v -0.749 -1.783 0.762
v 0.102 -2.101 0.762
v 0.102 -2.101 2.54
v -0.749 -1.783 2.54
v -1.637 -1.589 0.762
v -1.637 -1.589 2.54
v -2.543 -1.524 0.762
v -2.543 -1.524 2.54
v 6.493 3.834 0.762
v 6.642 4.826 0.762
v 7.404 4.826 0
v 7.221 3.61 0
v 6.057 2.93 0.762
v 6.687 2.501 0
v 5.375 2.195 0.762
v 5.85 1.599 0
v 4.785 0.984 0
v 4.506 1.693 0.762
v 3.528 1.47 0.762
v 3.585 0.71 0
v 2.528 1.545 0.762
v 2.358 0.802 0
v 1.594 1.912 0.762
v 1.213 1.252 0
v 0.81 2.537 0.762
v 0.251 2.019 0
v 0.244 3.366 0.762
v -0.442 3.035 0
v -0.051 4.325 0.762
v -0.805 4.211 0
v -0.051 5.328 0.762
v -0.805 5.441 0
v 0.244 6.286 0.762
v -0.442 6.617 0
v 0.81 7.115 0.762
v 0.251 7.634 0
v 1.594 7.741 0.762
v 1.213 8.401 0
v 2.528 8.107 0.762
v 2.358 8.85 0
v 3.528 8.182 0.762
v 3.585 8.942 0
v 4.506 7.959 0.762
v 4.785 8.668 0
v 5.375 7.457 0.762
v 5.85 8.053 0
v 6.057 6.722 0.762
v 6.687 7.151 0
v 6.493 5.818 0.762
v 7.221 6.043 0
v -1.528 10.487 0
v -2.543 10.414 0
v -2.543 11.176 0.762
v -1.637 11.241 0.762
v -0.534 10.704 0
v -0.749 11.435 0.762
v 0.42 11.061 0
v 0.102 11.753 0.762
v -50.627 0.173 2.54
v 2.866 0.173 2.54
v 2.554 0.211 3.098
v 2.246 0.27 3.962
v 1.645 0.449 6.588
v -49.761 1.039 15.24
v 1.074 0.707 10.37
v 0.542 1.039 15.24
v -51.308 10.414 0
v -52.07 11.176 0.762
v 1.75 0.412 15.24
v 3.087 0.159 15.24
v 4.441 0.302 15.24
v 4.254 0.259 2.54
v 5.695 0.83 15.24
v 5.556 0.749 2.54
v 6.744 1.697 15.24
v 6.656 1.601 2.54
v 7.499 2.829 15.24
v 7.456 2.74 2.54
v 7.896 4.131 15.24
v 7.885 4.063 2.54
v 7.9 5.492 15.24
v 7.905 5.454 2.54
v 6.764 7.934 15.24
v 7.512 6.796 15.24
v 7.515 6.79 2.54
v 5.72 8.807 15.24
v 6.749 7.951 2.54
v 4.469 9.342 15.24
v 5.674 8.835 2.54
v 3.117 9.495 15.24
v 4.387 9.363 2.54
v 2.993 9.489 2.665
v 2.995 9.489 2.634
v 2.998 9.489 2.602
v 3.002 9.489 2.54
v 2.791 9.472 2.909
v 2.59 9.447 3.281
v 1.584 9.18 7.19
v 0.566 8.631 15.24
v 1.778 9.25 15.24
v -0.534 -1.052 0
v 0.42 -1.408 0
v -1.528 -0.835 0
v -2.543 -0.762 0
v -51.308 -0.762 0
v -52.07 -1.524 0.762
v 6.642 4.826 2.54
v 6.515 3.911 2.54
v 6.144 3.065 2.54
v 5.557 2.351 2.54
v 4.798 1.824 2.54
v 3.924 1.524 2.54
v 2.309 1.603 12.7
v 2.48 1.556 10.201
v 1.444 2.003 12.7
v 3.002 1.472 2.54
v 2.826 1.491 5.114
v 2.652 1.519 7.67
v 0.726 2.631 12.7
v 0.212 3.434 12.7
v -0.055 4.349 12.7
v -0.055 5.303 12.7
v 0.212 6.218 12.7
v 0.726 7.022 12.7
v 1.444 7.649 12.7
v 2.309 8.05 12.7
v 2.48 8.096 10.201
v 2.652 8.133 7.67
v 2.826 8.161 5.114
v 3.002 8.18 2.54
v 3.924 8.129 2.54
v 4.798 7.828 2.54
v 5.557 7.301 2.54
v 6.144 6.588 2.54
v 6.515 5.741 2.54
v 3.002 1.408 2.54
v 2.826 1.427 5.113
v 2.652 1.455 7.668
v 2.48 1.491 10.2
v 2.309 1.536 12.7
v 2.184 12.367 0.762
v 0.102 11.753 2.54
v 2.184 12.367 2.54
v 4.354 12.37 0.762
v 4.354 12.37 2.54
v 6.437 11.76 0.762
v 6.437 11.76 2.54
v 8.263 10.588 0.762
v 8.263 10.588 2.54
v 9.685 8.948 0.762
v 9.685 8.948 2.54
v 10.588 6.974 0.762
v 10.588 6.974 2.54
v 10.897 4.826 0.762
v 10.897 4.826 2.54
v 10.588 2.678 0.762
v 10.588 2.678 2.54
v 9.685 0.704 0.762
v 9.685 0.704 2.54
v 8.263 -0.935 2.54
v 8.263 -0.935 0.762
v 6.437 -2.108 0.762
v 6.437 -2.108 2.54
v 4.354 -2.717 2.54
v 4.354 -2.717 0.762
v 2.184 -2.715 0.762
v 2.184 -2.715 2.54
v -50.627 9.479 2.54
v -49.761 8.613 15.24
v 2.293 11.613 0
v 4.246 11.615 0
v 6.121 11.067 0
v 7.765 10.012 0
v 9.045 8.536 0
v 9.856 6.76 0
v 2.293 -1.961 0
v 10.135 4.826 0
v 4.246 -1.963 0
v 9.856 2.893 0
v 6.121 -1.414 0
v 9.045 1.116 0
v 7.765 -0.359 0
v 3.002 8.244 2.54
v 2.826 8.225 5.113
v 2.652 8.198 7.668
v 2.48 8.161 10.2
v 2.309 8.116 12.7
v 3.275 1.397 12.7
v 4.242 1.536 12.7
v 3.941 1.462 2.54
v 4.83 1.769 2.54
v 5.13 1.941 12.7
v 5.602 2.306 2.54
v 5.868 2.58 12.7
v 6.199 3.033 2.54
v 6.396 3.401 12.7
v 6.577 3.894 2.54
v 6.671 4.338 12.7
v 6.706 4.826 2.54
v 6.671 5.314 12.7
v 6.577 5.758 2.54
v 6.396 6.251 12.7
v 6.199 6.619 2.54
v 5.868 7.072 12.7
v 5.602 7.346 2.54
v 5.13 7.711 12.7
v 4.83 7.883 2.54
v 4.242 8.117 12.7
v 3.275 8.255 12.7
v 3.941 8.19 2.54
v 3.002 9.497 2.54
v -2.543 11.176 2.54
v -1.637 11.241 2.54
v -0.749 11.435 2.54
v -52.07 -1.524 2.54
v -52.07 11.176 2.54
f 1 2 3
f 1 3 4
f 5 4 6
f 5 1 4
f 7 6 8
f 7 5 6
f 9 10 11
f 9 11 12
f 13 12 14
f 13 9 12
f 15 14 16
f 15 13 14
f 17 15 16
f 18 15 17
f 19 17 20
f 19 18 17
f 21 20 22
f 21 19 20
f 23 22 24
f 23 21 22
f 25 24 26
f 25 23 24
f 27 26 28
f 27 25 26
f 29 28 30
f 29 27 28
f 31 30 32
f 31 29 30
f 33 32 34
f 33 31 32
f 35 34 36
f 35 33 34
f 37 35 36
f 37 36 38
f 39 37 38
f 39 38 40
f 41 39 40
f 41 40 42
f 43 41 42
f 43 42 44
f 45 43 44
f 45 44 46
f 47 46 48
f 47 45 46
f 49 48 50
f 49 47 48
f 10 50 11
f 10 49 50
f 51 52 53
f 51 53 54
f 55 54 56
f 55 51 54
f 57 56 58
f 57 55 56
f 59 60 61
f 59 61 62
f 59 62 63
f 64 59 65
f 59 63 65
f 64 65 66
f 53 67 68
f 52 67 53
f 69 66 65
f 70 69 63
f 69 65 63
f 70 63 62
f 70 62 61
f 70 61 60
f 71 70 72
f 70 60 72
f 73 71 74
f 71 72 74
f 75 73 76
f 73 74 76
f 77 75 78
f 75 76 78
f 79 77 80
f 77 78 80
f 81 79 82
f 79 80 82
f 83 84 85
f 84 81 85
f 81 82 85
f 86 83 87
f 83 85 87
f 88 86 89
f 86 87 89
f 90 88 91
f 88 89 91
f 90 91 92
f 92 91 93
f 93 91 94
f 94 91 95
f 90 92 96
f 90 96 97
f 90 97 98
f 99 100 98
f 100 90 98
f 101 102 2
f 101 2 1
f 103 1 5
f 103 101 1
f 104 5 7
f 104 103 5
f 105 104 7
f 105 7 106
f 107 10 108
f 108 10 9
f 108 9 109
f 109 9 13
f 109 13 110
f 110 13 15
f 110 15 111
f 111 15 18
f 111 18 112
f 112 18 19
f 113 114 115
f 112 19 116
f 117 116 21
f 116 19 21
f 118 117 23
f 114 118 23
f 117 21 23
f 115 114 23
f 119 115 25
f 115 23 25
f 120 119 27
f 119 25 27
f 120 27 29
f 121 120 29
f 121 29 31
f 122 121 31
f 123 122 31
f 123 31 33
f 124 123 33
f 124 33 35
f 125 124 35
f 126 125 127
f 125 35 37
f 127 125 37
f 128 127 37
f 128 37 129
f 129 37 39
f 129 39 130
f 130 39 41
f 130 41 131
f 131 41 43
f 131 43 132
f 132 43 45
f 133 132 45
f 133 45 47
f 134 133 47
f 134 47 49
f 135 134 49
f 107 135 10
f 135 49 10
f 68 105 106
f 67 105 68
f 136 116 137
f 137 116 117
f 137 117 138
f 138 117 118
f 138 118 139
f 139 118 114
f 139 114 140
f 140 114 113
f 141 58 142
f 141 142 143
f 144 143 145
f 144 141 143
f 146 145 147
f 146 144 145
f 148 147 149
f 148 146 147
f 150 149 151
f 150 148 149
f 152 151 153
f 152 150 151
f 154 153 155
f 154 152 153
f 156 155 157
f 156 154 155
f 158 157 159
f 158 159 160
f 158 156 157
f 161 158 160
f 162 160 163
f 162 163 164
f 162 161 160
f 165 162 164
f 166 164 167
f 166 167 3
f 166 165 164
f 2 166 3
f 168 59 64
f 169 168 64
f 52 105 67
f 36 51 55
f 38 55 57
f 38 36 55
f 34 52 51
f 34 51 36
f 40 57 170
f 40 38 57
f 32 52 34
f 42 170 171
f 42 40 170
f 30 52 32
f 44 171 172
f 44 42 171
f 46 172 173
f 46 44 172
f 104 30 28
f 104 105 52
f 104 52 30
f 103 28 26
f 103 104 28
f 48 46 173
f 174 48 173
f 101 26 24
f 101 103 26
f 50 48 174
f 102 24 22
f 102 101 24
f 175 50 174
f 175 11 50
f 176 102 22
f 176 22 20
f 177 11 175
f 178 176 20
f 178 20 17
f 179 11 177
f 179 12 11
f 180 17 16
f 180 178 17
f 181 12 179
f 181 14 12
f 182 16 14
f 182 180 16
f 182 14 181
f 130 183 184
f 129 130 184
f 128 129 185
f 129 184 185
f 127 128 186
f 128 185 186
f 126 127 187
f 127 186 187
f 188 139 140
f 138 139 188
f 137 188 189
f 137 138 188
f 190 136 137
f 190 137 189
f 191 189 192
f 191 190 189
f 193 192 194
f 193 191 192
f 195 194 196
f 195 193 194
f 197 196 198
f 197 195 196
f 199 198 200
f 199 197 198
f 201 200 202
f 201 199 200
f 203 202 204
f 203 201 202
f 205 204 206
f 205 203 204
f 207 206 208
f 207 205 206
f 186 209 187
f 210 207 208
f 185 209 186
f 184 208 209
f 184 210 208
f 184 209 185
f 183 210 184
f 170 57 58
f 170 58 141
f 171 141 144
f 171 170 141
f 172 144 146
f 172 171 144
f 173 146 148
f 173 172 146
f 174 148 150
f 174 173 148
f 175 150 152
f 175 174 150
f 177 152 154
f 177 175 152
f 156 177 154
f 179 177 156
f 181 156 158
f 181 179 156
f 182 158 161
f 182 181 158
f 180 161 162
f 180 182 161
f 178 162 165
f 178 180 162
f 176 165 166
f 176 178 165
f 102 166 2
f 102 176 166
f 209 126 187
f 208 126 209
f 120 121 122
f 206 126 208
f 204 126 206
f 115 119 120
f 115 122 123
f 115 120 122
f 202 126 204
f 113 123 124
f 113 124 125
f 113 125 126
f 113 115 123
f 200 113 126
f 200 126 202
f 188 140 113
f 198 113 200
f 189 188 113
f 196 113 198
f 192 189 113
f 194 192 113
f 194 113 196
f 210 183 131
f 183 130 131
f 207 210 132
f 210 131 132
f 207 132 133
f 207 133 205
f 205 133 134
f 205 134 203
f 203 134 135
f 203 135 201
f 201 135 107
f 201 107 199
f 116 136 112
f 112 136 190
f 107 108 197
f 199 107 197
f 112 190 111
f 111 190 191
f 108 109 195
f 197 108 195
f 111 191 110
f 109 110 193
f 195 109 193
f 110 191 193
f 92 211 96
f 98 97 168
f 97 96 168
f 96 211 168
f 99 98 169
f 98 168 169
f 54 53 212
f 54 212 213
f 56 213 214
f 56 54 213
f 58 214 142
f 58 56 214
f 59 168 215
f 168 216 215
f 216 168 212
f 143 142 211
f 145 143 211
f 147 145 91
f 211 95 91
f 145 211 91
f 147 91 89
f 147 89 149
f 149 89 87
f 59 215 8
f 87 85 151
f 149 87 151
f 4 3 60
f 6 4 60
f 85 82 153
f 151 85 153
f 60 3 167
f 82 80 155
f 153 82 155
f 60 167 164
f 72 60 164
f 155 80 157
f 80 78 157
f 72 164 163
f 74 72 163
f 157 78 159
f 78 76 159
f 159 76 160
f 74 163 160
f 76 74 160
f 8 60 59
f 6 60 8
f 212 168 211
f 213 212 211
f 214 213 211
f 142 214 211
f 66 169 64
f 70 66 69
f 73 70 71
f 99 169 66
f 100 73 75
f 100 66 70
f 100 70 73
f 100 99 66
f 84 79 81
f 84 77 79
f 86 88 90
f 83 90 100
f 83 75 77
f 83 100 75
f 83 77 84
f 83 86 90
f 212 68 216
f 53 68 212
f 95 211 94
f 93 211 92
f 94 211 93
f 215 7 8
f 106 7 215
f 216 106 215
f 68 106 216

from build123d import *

# Parameters (mm, degrees)
F1_DEPTH = 15.24
F1_TAPER = 3.9
F3_DEPTH = 2.54
F4_R     = 3.3655
F5_DEPTH = 12.7
F6_R     = 4.6711310498
F6_R_2   = 3.429
F7_DEPTH = 12.7
F8_R     = 3.805331909
F9_DEPTH = 2.54
F10_SIZE = 0.762


with BuildPart() as f1:
    # F0 (on Top) → F1 (new body)
    with BuildSketch(Plane.XY):
        Polygon((-50.7999970374, 9.652), (-50.7999970374, 0), (3.175, 0), (3.175, 9.6704338458), align=None)
    extrude(amount=F1_DEPTH, taper=F1_TAPER)

    # F2 (on face) → F3 (join)
    with BuildSketch(Plane(origin=(0, 0, 0), x_dir=(1, 0, 0), z_dir=(0, 0, -1))):
        with BuildLine():
            ThreePointArc((-2.5432681699, -11.1761773853), (-1.1894436211, -11.3221739124), (0.1021277994, -11.7534501125))
            ThreePointArc((0.1021277994, -11.7534501125), (10.8966029626, -4.8261773853), (0.1021277994, 2.101095342))
            ThreePointArc((0.1021277994, 2.101095342), (-1.1894436211, 1.6698191419), (-2.5432681699, 1.5238226147))
            Line((-2.5432681699, 1.5238226147), (-52.0699970374, 1.5238226147))
            Line((-52.0699970374, 1.5238226147), (-52.0699970374, -11.1761773853))
            Line((-52.0699970374, -11.1761773853), (-2.5432681699, -11.1761773853))
        make_face()
    extrude(amount=-F3_DEPTH)

    # F4 (on face) → F5 (cut)
    with BuildSketch(Plane(origin=(0, 0, 0), x_dir=(1, 0, 0), z_dir=(0, 0, -1))):
        with Locations((3.2766029626, -4.8261773853)):
            Circle(F4_R)
    extrude(amount=-F5_DEPTH, mode=Mode.SUBTRACT)

    # F6 (on face) → F7 (join)
    with BuildSketch(Plane.XY.offset(2.54)):
        with Locations((3.2766029626, 4.8261773853)):
            Circle(F6_R)
        with Locations((3.2766029626, 4.8261773853)):
            Circle(F6_R_2, mode=Mode.SUBTRACT)
    extrude(amount=F7_DEPTH)

    # F8 (on face) → F9 (join)
    with BuildSketch(Plane.XY.offset(15.24)):
        with Locations((3.2766029626, 4.8261773853)):
            Circle(F8_R)
    extrude(amount=-F9_DEPTH)

    # F10
    f10_edges = [f1.edges().sort_by_distance(p)[0] for p in [
        (-1.189444, 11.322174, 0),
        (-27.306633, 11.176177, 0),
        (10.896603, 4.826177, 0),
        (-52.069997, 4.826177, 0),
        (-1.189444, -1.669819, 0),
        (-27.306633, -1.523823, 0),
        (-0.088897, 4.826177, 0),
    ]]
    chamfer(f10_edges, length=F10_SIZE)


solid = f1.part
